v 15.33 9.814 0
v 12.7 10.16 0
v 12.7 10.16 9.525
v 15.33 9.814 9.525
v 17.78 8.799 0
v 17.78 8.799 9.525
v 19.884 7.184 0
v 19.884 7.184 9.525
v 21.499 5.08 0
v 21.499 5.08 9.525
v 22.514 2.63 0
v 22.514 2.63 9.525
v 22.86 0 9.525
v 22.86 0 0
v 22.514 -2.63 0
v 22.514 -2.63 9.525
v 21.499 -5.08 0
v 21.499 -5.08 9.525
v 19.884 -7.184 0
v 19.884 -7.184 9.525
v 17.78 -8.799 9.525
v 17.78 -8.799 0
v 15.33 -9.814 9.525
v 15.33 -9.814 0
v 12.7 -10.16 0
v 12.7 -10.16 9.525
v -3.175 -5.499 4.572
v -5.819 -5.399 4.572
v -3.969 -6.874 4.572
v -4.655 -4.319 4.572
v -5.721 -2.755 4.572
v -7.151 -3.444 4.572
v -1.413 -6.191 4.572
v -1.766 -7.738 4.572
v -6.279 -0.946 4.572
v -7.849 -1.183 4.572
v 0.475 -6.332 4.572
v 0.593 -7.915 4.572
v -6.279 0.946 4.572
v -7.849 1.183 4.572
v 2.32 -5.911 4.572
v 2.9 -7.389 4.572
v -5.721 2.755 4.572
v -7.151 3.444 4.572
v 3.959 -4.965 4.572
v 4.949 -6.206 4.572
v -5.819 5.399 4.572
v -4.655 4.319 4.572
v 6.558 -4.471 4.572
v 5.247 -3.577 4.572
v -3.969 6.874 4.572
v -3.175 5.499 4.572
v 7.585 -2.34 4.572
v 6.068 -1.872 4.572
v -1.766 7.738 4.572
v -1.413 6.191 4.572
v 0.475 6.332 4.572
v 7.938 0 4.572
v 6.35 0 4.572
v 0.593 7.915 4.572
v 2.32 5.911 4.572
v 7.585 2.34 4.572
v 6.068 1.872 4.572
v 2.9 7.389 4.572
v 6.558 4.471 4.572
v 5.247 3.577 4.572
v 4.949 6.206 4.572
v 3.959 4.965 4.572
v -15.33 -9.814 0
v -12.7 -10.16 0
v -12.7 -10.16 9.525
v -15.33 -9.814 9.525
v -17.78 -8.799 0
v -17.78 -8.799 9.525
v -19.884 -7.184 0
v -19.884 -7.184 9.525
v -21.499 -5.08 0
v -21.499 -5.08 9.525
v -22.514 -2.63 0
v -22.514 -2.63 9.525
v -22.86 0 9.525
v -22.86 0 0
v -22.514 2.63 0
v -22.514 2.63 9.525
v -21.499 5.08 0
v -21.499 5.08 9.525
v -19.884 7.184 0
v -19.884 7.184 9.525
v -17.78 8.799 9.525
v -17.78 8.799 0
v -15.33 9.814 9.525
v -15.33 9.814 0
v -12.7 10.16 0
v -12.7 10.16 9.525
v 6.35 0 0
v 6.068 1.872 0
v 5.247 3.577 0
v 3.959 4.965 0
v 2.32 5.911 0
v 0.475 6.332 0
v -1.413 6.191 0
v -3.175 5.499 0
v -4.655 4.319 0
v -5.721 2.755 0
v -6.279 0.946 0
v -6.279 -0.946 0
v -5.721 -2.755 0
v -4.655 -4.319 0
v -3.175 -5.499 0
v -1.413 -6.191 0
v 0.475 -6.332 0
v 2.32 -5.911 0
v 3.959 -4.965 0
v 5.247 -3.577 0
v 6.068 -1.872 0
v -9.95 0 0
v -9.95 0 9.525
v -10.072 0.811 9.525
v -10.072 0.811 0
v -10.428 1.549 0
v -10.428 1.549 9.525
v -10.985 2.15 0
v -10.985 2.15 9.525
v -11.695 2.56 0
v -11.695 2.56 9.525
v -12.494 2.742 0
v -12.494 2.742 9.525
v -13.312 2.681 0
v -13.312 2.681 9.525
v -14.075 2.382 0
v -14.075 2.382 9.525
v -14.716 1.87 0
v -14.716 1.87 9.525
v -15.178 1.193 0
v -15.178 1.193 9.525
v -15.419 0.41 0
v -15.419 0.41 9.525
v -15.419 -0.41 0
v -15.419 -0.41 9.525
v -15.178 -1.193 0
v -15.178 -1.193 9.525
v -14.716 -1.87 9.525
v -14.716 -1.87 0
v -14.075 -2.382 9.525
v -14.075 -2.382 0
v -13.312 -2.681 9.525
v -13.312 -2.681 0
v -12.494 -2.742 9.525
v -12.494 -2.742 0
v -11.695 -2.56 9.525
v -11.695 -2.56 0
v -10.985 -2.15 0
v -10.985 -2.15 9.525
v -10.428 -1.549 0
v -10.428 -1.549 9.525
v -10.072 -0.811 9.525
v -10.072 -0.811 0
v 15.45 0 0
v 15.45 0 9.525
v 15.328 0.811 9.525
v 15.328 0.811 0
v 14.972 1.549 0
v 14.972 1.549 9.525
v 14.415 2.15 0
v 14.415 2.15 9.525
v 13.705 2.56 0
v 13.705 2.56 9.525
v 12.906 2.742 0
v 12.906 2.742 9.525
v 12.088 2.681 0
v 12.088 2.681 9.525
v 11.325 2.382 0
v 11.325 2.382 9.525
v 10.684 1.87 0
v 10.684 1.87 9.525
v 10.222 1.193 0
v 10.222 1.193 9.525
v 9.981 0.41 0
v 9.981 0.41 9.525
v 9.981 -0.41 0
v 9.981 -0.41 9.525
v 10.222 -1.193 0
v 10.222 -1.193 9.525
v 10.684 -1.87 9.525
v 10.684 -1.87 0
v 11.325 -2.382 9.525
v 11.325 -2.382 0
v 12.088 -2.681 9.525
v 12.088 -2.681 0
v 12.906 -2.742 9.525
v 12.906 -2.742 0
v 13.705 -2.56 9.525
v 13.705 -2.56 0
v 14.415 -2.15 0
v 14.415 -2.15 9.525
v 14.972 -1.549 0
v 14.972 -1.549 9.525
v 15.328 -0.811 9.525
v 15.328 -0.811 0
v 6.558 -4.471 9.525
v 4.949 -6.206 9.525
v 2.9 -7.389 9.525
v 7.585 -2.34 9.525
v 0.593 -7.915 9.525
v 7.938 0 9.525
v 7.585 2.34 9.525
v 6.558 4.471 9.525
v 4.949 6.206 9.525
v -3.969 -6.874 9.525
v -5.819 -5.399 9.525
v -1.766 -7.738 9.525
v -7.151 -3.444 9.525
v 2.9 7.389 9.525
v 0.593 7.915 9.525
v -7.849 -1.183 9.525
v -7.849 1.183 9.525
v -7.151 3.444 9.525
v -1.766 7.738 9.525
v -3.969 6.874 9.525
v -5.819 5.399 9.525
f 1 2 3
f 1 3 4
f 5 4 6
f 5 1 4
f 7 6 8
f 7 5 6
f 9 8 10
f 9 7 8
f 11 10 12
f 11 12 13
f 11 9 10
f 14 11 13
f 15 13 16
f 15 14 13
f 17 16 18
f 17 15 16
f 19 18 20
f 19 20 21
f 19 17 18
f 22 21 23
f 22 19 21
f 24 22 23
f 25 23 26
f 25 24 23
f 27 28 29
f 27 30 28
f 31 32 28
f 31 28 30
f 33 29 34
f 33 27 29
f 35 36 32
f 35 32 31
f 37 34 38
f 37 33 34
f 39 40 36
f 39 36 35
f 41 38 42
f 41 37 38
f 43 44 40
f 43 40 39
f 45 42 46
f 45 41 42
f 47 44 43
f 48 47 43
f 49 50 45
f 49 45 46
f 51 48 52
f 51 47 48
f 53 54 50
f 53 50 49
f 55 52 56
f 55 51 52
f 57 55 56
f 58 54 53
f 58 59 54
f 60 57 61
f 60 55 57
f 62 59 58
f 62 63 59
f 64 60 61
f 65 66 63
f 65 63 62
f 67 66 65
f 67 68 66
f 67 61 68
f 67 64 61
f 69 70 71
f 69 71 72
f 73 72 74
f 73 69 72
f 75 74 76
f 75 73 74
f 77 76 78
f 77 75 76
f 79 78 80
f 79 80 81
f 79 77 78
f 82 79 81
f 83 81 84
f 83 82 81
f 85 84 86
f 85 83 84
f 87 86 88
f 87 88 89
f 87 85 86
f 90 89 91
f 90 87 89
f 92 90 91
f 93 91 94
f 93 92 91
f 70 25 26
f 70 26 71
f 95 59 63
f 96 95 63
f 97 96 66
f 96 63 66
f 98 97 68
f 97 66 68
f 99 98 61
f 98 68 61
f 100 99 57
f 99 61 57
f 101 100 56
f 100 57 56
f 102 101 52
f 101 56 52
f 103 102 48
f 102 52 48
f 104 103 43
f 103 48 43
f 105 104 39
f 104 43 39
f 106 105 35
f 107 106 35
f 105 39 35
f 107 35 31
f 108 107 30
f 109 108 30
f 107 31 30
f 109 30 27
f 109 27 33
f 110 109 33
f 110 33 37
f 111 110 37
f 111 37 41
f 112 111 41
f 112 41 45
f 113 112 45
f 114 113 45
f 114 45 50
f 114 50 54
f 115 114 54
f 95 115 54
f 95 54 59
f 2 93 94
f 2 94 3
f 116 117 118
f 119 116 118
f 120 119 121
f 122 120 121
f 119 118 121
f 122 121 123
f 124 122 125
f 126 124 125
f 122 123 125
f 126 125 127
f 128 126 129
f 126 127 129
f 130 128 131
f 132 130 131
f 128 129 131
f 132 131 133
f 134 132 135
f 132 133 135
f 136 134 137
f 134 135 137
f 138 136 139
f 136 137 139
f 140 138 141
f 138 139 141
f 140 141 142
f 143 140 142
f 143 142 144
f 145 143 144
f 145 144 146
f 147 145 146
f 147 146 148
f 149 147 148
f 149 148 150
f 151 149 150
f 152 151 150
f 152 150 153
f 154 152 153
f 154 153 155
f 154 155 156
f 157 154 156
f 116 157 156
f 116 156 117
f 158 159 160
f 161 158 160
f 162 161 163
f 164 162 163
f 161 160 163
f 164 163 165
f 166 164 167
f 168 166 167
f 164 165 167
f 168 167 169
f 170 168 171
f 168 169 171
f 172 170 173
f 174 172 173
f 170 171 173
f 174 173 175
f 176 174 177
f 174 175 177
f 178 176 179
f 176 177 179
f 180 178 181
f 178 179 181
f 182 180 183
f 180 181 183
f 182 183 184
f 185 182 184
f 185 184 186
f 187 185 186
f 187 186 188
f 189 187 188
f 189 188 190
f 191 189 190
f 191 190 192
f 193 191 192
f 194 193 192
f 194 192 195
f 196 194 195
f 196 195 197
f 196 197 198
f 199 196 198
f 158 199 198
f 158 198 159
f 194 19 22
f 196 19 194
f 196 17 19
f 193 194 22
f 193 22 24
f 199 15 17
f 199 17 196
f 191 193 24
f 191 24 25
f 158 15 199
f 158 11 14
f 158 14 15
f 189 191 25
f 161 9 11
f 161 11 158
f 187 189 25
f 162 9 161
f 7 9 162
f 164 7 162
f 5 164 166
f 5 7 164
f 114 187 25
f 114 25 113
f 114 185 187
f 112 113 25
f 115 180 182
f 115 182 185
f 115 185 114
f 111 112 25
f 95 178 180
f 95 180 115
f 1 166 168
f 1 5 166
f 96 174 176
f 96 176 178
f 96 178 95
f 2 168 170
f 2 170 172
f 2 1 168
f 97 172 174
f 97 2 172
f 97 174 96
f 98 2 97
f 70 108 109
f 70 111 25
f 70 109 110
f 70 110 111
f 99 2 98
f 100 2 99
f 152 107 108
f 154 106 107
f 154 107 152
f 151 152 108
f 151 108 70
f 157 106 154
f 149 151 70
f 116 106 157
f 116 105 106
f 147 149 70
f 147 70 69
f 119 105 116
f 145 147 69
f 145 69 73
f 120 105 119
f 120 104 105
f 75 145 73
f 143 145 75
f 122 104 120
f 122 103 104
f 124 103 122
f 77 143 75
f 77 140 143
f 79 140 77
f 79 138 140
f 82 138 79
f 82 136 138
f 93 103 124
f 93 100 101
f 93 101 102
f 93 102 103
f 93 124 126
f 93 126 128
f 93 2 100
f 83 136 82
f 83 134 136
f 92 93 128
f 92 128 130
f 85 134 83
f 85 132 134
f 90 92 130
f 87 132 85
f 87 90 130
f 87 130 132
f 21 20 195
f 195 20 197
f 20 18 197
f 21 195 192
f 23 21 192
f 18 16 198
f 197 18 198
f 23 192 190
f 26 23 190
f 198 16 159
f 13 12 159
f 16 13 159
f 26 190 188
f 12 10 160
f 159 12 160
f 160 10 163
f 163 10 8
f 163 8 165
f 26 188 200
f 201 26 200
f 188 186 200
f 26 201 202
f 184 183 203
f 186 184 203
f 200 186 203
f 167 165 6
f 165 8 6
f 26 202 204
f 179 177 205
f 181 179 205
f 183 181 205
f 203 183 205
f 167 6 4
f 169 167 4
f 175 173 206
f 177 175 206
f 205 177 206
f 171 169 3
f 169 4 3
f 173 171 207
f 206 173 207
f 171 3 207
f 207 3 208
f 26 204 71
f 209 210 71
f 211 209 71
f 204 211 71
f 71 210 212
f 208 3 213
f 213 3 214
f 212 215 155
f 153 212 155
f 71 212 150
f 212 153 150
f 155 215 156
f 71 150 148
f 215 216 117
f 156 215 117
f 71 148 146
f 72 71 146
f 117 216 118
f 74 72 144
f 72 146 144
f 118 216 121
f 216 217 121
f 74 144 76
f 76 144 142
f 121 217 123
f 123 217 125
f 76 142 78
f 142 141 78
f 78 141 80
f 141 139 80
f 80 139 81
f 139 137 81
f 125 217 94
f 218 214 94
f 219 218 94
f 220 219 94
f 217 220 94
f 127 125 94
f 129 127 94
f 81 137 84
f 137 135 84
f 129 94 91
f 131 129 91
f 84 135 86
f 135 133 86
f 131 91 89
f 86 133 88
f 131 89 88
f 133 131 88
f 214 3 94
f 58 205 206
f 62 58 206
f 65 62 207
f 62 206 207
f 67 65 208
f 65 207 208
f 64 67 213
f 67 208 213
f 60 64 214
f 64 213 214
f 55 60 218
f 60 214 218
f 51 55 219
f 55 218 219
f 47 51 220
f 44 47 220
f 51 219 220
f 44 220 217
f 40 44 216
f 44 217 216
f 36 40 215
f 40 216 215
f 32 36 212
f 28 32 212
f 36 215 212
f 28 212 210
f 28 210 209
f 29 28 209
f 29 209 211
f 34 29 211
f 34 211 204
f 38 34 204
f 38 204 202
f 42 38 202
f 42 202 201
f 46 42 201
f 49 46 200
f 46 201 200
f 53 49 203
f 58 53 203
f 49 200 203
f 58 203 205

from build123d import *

# Parameters (mm, degrees)
BOSS_EXTRUDE5_DEPTH = 9.525
SKETCH5_R           = 7.9375
CUT_EXTRUDE3_DEPTH  = 4.953
SKETCH6_R           = 6.35
SKETCH6_R_2         = 2.75
CUT_EXTRUDE4_DEPTH  = 27.768093414


with BuildPart() as part:
    # Sketch2 → Boss-Extrude5 (new body)
    with BuildSketch(Plane.XY):
        with BuildLine():
            Line((-12.7, 10.16), (12.7, 10.16))
            ThreePointArc((12.7, 10.16), (22.86, 0), (12.7, -10.16))
            Line((12.7, -10.16), (-12.7, -10.16))
            ThreePointArc((-12.7, -10.16), (-22.86, 0), (-12.7, 10.16))
        make_face()
    extrude(amount=BOSS_EXTRUDE5_DEPTH)

    # Sketch5 → Cut-Extrude3 (cut)
    with BuildSketch(Plane.XY.offset(9.525)):
        Circle(SKETCH5_R)
    extrude(amount=-CUT_EXTRUDE3_DEPTH, mode=Mode.SUBTRACT)

    # Sketch6 → Cut-Extrude4 (cut, through all)
    with BuildSketch(Plane.XY.offset(9.525)):
        Circle(SKETCH6_R)
        with Locations((-12.7, 0)):
            Circle(SKETCH6_R_2)
        with Locations((12.7, 0)):
            Circle(SKETCH6_R_2)
    extrude(amount=-CUT_EXTRUDE4_DEPTH, mode=Mode.SUBTRACT)


solid = part.part
